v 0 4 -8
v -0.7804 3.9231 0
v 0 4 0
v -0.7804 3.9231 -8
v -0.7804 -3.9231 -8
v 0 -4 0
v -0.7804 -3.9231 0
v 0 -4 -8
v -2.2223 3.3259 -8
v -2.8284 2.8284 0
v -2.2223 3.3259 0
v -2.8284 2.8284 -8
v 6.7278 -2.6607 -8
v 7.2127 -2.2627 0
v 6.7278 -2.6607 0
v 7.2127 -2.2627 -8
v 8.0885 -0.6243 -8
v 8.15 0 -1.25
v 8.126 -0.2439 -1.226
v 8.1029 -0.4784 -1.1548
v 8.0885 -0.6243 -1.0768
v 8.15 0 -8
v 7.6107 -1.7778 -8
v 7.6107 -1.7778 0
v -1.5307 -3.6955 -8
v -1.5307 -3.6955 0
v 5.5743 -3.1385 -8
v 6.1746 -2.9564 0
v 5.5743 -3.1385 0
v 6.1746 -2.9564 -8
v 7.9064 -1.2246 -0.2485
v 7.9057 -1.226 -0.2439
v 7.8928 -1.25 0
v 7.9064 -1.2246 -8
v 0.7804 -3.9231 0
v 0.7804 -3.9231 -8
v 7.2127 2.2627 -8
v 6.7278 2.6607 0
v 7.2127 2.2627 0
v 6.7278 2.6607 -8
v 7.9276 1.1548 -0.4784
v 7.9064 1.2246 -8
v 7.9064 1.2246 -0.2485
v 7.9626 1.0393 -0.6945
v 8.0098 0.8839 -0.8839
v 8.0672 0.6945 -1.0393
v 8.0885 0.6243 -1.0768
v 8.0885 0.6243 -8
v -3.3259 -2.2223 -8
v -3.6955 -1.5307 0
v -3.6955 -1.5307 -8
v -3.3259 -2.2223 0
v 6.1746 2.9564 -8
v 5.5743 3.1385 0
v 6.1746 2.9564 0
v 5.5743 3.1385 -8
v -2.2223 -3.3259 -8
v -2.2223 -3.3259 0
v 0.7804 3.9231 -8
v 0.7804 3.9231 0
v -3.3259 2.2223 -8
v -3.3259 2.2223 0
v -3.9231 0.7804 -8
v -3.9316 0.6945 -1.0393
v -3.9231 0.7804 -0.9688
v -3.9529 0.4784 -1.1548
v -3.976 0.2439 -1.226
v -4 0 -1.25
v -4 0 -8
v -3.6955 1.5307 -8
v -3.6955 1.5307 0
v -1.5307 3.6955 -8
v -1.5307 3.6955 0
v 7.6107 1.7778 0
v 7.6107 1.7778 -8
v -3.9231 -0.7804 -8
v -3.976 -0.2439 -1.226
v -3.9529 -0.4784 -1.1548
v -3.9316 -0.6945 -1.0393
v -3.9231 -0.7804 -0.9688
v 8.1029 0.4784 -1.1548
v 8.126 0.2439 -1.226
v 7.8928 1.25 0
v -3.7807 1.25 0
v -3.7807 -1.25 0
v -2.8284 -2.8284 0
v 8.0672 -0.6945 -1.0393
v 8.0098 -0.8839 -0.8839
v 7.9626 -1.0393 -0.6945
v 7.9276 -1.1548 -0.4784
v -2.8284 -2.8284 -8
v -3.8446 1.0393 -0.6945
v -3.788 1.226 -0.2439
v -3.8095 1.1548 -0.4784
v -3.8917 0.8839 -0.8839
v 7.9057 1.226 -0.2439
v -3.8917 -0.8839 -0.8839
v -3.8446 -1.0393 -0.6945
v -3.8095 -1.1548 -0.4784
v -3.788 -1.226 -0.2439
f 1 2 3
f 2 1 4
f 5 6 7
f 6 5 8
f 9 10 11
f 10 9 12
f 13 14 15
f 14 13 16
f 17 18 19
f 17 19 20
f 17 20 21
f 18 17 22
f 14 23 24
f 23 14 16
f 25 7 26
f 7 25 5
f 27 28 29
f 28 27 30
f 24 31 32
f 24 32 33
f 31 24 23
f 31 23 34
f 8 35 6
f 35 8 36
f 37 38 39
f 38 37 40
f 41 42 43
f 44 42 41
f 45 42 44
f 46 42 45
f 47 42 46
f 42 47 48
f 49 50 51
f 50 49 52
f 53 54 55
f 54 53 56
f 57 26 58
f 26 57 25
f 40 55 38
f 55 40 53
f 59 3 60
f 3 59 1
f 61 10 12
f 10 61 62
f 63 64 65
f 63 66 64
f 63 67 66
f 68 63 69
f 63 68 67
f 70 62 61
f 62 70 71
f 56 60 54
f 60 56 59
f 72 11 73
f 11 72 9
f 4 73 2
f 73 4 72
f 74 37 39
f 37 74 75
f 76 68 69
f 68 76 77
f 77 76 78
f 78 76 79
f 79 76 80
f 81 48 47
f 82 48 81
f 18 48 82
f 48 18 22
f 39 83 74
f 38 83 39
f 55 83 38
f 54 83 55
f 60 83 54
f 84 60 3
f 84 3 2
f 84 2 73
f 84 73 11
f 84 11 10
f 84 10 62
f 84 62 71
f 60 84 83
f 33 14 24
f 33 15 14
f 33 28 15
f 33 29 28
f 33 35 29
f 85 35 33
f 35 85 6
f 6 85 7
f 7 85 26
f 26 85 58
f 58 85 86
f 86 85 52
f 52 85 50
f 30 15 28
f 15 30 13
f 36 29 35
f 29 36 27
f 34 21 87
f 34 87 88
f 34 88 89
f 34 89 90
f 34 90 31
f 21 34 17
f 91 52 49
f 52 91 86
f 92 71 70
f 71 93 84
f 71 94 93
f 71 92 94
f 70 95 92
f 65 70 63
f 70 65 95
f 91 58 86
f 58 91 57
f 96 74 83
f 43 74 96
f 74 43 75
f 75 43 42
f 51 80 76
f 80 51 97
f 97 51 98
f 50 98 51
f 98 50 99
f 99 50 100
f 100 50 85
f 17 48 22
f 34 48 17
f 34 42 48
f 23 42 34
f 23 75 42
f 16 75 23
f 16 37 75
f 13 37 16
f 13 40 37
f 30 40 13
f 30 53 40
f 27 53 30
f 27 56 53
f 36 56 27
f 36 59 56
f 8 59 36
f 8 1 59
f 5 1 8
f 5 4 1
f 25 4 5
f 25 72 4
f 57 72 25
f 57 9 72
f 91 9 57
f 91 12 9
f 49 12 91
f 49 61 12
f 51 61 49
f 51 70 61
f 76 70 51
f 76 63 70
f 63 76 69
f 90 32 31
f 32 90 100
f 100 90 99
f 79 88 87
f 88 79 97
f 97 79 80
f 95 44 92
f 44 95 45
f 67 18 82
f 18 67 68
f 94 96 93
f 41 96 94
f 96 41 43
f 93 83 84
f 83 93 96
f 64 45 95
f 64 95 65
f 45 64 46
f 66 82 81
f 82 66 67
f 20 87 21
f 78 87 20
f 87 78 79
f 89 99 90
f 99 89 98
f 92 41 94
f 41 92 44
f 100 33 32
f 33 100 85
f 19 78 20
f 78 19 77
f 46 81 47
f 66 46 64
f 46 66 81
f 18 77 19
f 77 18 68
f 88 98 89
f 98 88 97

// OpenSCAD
// COBRA Finger Segment - DISTAL
// Length: 4.95mm, Width: 8mm

$fn = 32;

module finger_segment() {
    difference() {
        hull() {
            translate([0, 0, -4])
            cylinder(h=8, d=8, center=true);
            
            translate([4.95, 0, -4])
            cylinder(h=8, d=6.4, center=true);
        }
        
        // Tendon channel
        translate([2.475, 0, 0])
        rotate([0, 90, 0])
        cylinder(h=6.95, d=2.5, center=true);
        
        // Pivot holes
        translate([0, 0, 0])
        rotate([0, 90, 0])
        cylinder(h=10, d=2.5, center=true);
        
        translate([4.95, 0, 0])
        rotate([0, 90, 0])
        cylinder(h=10, d=2.5, center=true);
    }
}

finger_segment();
